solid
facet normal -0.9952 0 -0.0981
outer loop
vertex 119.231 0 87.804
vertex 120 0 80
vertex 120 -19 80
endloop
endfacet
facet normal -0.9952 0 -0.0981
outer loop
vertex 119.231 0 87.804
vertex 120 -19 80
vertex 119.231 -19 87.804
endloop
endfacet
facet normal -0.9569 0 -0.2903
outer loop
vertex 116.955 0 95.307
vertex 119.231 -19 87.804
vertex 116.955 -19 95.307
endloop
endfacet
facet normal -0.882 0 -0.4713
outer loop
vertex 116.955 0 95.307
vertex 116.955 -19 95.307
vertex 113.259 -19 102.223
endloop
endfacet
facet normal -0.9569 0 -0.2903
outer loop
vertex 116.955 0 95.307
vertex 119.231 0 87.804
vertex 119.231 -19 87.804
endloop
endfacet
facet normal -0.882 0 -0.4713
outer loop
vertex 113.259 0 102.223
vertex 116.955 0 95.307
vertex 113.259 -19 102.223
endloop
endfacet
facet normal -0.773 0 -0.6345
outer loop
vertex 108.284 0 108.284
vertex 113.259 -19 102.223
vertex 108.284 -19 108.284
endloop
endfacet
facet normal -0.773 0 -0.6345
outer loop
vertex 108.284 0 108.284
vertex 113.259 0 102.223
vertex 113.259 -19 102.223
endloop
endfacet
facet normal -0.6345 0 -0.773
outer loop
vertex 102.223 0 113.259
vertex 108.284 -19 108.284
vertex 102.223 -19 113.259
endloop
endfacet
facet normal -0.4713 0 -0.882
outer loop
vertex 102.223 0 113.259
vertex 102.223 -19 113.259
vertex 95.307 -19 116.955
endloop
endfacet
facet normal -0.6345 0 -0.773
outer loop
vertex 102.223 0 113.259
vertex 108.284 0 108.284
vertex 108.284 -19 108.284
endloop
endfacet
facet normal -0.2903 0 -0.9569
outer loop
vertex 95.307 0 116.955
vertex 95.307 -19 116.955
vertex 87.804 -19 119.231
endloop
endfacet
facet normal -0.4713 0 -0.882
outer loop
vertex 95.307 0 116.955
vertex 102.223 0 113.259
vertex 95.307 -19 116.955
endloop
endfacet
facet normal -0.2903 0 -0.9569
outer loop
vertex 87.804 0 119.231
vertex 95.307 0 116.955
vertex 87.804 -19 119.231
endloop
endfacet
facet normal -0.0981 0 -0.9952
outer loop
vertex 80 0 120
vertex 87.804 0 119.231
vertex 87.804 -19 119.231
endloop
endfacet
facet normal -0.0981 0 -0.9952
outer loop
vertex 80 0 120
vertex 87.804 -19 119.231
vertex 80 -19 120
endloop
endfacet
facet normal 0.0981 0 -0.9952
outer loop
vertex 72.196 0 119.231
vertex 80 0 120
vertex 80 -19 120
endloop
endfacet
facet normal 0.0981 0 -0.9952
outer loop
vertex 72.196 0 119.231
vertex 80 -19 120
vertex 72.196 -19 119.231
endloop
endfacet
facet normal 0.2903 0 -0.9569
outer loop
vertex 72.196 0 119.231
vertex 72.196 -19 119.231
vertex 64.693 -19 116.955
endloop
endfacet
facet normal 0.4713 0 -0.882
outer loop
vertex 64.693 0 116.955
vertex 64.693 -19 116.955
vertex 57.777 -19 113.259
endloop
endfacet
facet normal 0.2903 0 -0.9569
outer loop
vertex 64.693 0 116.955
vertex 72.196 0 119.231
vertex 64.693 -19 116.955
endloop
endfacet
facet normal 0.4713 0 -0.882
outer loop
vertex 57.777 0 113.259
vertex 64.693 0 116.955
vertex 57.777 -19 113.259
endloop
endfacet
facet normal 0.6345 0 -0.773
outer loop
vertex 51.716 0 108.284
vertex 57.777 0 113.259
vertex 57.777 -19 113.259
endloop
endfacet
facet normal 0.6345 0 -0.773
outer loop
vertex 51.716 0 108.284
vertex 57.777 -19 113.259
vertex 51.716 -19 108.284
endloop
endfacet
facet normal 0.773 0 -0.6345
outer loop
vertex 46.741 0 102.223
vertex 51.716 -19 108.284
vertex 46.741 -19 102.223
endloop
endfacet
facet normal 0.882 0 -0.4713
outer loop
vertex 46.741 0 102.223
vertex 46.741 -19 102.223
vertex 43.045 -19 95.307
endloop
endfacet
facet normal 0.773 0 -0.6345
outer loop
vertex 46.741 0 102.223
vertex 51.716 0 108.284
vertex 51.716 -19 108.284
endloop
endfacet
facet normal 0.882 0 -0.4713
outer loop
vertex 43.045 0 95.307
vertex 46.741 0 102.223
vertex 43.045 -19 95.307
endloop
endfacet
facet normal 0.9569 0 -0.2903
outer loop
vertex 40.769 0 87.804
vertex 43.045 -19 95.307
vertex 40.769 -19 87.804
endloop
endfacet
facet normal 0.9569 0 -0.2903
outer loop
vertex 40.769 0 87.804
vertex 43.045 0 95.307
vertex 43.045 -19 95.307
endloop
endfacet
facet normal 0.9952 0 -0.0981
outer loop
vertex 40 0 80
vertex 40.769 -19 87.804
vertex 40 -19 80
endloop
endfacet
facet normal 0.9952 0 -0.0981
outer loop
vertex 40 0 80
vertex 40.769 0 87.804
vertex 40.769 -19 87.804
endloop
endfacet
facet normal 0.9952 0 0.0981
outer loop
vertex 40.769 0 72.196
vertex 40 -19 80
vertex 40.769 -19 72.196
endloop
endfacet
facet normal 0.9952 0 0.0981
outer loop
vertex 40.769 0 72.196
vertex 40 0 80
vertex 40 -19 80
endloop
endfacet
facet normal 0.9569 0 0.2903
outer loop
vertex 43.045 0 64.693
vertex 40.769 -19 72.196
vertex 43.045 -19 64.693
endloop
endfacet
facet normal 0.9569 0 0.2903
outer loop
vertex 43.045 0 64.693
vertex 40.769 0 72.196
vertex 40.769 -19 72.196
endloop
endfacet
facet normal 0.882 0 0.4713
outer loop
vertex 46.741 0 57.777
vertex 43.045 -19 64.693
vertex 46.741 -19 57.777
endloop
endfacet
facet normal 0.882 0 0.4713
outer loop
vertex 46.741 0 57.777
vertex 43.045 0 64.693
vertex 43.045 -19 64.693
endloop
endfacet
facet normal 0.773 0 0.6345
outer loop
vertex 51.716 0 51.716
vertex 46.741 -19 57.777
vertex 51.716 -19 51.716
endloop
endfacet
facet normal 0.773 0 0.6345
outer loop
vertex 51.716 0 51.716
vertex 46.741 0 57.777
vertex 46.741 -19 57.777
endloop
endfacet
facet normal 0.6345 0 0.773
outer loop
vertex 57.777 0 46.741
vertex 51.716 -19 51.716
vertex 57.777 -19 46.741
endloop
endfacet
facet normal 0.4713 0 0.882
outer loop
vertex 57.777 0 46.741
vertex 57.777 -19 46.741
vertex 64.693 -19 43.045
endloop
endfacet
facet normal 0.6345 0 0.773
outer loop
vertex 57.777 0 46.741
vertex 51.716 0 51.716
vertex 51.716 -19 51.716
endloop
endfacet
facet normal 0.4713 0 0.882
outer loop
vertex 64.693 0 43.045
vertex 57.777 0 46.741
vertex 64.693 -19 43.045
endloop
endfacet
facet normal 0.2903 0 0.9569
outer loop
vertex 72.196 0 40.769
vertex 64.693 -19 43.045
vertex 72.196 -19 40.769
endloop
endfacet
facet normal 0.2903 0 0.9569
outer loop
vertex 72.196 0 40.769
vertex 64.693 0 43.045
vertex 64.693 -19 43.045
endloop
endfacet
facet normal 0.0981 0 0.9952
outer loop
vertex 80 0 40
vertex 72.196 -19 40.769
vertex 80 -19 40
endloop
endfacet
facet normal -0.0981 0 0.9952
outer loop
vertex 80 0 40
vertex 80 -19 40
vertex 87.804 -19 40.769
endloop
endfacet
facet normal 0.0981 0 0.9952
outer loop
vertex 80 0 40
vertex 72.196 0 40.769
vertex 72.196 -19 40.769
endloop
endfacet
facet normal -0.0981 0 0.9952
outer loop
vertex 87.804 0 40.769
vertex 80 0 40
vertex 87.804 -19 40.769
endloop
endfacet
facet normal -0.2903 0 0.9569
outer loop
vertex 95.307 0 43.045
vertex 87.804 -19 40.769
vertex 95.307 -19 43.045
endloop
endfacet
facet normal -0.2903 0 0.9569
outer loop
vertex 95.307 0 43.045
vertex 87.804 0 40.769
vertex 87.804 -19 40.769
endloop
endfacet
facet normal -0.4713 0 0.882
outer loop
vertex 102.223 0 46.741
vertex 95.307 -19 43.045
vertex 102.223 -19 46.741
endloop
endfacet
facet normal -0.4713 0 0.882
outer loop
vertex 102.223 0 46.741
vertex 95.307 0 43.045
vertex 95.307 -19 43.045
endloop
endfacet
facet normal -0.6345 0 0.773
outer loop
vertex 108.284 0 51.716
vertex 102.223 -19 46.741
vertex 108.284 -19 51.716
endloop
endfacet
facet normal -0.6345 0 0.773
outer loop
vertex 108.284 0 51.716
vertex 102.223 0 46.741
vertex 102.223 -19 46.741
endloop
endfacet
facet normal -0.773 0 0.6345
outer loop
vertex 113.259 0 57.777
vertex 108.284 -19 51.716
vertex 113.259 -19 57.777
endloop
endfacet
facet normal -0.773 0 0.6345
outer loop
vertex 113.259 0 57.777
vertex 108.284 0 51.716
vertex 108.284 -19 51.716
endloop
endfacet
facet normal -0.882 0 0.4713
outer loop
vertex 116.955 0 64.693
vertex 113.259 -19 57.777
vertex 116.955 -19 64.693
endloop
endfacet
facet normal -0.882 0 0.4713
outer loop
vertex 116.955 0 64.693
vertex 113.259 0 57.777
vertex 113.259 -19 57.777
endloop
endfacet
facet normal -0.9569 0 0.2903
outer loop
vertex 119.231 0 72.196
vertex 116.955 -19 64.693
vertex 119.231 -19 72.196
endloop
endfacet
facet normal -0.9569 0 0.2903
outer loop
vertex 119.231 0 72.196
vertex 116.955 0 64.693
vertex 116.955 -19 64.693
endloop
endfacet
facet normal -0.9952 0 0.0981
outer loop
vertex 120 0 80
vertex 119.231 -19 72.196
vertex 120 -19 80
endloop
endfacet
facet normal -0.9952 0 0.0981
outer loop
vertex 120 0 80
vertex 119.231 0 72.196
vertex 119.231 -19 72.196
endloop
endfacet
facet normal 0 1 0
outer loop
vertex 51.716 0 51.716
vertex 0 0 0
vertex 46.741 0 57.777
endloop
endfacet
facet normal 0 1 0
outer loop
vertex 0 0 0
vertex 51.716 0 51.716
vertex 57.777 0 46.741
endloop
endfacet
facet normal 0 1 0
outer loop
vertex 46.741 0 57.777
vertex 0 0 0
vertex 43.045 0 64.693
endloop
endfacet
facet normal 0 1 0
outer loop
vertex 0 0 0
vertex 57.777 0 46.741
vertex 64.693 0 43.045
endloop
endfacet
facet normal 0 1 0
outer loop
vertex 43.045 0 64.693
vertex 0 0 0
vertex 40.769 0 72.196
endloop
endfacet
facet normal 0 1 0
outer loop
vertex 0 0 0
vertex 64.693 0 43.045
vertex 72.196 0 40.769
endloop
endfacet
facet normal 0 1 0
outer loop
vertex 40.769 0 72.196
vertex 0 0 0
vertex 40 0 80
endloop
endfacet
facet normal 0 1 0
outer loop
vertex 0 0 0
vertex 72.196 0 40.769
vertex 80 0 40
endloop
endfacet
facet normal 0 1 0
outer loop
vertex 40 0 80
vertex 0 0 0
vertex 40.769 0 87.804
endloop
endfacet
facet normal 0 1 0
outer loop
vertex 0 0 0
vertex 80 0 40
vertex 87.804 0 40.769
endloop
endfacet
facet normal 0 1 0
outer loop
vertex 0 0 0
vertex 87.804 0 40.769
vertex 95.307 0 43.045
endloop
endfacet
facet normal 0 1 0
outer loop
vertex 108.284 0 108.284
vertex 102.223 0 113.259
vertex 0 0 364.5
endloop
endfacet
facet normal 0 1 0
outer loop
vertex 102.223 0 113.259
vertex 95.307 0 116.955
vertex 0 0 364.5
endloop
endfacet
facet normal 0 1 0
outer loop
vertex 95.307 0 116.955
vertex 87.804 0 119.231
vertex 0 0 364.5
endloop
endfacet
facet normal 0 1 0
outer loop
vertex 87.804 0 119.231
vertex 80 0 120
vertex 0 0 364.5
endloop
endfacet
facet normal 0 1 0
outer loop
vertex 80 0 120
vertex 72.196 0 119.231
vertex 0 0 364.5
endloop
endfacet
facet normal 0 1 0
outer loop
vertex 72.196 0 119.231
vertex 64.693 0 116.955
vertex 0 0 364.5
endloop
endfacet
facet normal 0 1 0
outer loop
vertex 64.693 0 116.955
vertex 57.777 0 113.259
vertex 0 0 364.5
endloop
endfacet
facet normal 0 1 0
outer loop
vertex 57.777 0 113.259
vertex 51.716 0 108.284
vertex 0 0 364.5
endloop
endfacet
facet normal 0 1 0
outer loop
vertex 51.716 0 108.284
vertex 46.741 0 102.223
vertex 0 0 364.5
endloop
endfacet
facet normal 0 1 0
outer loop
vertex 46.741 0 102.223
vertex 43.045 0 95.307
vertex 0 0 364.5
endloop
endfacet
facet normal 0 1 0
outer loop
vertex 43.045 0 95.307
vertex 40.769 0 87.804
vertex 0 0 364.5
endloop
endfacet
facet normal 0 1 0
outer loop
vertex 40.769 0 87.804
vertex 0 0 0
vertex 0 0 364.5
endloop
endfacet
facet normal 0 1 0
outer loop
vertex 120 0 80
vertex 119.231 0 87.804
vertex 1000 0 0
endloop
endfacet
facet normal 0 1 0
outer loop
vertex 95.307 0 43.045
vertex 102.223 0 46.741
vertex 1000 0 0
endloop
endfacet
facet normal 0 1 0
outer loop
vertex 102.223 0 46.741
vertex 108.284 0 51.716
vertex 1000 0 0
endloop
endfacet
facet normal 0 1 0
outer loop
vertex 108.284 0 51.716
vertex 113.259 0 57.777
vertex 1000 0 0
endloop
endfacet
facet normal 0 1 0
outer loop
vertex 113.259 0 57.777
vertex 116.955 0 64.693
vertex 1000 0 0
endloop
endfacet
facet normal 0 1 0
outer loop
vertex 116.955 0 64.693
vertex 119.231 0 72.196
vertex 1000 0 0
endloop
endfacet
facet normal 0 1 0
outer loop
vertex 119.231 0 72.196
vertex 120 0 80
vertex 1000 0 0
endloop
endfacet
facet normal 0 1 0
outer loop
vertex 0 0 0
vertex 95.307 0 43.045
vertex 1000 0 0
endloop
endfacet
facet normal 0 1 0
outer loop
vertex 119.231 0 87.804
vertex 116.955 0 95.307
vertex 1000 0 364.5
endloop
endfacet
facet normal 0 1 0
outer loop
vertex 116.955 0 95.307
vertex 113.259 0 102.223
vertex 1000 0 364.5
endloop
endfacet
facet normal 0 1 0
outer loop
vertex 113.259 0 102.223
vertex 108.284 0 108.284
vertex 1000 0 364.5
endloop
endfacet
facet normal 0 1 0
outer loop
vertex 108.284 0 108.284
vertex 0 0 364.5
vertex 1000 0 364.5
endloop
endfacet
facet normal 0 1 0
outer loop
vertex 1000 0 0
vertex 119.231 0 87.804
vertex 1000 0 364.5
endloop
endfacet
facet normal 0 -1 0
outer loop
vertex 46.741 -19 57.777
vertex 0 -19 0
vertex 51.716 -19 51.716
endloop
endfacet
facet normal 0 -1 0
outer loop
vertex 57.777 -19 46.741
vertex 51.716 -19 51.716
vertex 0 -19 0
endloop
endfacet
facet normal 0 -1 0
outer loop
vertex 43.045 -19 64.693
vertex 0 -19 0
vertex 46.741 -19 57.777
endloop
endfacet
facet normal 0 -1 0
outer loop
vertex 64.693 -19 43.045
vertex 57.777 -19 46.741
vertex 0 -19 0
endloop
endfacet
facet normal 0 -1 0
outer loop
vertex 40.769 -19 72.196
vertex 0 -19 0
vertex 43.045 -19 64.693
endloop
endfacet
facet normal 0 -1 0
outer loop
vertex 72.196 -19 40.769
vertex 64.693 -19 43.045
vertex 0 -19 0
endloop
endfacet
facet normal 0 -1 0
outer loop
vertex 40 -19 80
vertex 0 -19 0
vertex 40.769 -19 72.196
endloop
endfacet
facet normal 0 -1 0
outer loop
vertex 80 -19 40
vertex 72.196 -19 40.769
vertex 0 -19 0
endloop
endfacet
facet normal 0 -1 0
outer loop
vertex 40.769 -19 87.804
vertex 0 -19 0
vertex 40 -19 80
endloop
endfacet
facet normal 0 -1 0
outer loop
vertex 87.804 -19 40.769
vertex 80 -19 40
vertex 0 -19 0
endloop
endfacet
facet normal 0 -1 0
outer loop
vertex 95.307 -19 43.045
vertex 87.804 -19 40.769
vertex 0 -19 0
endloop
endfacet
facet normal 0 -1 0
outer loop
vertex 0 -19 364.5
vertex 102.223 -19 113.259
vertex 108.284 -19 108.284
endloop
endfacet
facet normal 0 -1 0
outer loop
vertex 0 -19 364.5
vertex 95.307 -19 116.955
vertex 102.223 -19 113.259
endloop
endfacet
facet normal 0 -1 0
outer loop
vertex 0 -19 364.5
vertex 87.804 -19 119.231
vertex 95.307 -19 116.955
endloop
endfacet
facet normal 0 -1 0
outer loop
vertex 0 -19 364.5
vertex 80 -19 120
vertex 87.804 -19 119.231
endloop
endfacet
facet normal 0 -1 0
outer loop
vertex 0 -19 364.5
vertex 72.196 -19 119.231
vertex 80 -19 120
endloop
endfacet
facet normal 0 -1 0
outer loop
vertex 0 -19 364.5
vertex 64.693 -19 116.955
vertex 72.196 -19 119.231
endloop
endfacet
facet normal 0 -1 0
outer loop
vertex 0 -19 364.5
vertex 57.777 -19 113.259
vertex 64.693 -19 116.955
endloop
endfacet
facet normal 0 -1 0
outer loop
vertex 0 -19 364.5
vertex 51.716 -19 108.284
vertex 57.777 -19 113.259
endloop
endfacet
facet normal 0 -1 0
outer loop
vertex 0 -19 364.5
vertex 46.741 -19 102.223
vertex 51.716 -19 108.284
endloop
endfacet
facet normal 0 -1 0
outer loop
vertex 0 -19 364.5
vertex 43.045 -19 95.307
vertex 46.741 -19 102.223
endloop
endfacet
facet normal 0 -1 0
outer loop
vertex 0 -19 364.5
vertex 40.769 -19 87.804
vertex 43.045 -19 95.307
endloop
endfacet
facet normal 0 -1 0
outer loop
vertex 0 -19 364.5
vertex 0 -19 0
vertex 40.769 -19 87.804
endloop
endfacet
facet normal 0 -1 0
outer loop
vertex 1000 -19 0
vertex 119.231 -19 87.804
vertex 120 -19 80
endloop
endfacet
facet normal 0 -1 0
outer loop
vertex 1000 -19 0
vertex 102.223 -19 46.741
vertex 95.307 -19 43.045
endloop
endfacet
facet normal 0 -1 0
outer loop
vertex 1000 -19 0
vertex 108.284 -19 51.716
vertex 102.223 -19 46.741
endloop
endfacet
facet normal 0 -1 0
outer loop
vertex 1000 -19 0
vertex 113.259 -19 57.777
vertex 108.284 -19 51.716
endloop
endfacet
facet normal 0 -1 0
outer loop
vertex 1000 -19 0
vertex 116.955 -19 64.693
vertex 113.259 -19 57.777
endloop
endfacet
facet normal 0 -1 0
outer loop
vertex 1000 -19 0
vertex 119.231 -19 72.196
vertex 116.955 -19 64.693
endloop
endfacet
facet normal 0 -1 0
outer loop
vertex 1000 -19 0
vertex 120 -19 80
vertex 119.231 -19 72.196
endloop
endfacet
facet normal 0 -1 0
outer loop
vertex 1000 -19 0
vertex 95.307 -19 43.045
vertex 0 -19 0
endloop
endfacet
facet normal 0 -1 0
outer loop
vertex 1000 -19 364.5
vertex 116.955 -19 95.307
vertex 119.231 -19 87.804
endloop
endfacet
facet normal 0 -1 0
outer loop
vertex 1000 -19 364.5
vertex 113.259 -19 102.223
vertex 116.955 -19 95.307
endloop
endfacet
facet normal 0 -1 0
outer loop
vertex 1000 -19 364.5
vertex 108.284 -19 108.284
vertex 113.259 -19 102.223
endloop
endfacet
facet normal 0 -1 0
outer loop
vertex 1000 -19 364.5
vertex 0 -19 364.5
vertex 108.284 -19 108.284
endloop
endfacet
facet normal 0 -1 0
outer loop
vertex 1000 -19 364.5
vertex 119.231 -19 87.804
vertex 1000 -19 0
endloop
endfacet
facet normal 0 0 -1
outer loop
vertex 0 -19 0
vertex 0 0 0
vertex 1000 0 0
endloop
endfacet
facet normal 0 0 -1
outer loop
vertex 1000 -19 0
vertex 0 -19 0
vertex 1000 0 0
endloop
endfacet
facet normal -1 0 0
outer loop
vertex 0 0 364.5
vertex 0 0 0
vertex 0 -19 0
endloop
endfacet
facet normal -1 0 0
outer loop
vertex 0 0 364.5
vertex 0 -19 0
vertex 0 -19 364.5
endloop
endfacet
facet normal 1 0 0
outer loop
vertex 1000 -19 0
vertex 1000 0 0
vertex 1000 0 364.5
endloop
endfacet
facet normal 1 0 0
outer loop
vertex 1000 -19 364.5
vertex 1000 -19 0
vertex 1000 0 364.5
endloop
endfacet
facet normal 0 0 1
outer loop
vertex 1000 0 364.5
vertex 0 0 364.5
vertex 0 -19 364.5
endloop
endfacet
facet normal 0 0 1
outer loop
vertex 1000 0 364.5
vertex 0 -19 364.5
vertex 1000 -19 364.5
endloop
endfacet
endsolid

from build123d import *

# Parameters (mm, degrees)
F1_W     = 1000
F1_H     = 364.5
F1_R     = 40
F2_DEPTH = 19


with BuildPart() as f2:
    # F1 (on Front) → F2 (new body)
    with BuildSketch(Plane.XZ):
        with Locations((500, 207.25)):
            Rectangle(F1_W, F1_H)
        with Locations((80, 105)):
            Circle(F1_R, mode=Mode.SUBTRACT)
    extrude(amount=F2_DEPTH)


with BuildPart() as f2_1:
    # F3: moved
    add(f2.part.moved(Location((0, 0, -25))))


solid = f2_1.part
